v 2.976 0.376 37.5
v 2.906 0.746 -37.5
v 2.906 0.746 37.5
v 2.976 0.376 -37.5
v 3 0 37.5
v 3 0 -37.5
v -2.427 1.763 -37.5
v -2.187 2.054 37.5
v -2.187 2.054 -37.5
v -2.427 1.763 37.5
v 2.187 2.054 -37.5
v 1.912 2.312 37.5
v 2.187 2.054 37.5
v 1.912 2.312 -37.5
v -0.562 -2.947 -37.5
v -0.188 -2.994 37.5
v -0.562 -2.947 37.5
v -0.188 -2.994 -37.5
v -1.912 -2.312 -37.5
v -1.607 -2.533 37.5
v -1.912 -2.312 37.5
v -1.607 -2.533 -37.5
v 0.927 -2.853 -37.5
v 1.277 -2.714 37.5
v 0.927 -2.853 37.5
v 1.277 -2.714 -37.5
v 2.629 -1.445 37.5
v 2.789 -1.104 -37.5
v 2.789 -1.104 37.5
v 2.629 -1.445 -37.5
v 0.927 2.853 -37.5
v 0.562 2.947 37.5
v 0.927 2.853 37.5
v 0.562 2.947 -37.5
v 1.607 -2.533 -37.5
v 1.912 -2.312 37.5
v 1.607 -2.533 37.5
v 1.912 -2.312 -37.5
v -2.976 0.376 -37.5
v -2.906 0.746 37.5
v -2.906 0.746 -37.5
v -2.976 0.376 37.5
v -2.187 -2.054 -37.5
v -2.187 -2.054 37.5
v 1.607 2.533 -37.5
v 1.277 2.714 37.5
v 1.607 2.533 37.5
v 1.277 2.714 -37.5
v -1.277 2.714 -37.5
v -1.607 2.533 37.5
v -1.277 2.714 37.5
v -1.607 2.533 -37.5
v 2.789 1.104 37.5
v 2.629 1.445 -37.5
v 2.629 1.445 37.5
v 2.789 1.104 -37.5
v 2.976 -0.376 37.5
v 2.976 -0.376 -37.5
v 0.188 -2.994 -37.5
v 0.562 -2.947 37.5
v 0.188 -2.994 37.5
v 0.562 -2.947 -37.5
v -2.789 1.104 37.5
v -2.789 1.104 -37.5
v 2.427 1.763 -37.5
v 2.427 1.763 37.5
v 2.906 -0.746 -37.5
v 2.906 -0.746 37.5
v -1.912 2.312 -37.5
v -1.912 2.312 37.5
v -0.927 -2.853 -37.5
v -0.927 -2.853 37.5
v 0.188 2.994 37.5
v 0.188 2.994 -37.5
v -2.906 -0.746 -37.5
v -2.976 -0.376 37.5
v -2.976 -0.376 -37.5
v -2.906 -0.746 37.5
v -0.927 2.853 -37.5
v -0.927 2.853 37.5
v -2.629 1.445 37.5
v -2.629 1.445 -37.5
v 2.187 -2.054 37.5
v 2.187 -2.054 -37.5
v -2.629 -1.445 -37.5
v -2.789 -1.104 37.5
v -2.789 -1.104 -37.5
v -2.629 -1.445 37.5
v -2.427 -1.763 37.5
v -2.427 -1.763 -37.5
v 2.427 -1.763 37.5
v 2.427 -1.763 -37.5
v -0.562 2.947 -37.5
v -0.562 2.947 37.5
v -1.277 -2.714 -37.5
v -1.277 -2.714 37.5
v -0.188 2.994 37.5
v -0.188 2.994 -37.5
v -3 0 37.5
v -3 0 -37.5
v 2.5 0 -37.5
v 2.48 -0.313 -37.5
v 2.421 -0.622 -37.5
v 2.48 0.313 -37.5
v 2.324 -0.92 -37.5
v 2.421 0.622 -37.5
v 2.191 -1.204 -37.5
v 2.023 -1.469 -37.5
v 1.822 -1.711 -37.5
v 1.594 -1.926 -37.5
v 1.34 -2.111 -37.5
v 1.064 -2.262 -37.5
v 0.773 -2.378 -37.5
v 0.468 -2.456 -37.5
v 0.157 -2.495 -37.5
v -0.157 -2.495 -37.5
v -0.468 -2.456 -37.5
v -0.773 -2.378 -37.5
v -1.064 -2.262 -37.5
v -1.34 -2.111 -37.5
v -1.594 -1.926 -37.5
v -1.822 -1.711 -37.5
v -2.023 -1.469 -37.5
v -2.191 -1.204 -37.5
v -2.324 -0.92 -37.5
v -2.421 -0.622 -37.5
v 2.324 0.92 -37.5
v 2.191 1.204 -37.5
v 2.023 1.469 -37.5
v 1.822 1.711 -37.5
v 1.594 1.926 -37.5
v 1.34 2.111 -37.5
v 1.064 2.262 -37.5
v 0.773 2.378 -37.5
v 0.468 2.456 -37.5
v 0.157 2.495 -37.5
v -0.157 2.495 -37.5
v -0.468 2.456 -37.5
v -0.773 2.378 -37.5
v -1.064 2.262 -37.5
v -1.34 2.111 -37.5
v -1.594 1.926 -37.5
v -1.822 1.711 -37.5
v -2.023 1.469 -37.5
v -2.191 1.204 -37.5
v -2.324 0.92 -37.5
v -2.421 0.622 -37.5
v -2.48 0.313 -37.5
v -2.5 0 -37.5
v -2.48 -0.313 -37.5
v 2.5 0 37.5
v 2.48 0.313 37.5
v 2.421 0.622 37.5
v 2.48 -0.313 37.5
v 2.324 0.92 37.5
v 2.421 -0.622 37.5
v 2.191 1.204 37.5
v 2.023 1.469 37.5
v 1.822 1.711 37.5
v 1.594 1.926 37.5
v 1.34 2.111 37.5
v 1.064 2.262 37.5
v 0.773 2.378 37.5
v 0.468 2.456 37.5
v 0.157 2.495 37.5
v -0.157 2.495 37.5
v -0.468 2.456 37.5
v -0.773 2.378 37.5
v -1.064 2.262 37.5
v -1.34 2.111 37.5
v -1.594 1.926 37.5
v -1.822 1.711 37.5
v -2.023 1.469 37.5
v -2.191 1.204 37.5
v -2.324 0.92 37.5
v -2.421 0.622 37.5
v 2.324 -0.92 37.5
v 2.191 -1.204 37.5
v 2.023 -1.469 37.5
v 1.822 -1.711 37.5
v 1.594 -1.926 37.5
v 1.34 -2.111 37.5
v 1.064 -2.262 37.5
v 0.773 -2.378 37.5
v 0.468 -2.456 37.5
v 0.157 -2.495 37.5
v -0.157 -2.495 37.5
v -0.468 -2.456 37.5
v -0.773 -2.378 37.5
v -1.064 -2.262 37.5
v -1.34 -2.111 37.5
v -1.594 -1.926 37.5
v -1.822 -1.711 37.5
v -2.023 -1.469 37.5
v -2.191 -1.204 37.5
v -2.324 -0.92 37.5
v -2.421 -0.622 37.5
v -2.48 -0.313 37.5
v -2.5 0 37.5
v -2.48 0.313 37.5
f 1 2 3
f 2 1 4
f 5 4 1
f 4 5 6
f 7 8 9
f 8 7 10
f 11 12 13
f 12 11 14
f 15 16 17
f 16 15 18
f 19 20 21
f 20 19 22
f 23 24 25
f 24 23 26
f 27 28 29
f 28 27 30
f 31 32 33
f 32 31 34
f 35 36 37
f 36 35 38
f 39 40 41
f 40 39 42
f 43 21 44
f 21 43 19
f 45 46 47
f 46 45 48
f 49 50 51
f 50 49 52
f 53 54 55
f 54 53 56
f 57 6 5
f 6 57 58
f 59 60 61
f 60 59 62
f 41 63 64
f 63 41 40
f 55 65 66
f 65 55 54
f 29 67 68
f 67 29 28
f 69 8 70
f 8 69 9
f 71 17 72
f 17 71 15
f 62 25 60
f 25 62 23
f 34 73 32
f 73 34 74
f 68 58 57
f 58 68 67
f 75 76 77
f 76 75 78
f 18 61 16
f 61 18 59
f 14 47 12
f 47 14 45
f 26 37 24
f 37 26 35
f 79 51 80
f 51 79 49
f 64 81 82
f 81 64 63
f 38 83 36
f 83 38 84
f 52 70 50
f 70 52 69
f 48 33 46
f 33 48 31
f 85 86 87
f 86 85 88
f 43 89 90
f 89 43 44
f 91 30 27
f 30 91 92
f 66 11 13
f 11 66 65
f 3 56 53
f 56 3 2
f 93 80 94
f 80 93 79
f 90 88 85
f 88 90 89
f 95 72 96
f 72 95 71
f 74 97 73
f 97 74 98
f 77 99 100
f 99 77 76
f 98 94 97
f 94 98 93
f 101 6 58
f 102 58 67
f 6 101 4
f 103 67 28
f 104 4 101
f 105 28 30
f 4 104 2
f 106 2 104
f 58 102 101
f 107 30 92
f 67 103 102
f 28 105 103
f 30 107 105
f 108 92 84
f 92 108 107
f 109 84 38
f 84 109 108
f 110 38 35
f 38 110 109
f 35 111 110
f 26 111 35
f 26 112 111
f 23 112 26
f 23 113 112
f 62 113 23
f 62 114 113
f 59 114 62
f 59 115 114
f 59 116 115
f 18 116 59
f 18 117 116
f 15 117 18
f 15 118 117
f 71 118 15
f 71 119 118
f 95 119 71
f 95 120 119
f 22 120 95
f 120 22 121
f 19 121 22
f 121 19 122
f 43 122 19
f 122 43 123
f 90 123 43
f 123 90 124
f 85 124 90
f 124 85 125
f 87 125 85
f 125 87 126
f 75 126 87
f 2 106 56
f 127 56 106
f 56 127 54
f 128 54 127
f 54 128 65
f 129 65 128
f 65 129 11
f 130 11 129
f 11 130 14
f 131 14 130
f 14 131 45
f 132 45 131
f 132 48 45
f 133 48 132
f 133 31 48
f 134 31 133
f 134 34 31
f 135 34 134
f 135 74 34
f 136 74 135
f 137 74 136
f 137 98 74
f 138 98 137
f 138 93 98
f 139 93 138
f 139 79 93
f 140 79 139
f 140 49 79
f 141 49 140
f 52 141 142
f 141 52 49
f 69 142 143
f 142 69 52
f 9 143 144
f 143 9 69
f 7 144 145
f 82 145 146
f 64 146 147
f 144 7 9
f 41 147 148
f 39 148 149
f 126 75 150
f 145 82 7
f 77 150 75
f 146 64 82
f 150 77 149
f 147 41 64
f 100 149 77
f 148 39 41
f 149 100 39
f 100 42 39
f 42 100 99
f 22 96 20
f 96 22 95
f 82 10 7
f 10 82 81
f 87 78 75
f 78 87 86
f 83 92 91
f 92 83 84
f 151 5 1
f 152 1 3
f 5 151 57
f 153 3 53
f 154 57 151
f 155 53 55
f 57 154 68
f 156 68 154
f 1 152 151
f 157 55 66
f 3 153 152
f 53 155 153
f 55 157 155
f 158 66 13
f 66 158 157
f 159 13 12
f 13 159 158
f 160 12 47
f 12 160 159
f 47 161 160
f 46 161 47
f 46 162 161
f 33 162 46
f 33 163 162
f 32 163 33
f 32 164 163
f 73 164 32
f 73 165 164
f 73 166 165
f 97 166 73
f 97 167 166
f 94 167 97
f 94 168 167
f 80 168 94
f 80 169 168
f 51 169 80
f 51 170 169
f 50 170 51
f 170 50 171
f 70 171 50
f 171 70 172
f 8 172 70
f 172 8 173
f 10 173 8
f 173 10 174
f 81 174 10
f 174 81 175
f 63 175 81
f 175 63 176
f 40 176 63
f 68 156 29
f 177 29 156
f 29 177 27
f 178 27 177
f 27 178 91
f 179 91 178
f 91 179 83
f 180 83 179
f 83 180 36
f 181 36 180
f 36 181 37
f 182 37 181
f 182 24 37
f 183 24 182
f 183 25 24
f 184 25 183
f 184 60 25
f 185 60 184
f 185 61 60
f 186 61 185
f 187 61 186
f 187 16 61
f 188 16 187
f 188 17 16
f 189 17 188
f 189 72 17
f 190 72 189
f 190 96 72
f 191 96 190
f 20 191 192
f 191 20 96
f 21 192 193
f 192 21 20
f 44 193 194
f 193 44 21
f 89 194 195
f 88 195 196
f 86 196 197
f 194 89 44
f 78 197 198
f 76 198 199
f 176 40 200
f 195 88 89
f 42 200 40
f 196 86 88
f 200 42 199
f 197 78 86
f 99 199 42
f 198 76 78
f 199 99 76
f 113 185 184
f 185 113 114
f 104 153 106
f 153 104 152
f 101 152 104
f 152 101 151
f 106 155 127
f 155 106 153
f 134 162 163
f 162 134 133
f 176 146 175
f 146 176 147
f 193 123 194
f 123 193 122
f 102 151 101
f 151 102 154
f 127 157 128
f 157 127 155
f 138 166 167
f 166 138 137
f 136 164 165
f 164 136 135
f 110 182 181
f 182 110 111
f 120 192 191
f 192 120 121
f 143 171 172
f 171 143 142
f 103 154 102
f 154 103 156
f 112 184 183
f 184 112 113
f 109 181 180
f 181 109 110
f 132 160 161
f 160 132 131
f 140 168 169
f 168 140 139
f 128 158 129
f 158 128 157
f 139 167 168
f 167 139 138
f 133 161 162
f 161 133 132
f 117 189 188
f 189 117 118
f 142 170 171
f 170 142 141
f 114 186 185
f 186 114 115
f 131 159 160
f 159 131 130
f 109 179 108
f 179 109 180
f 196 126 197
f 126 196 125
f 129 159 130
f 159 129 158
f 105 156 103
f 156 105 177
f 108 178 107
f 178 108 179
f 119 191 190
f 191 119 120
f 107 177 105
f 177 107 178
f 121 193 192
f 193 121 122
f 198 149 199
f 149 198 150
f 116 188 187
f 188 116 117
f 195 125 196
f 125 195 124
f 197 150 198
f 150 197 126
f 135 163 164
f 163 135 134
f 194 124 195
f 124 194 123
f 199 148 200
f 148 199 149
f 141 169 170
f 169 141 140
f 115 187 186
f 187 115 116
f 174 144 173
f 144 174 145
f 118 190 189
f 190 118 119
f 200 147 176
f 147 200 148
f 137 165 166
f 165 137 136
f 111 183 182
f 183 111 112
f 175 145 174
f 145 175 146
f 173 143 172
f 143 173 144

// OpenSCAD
$fn = 50;


difference() {
	union() {
		translate(v = [0, 0, -37.5000000000]) {
			cylinder(h = 75, r = 3.0000000000);
		}
	}
	union() {
		translate(v = [0, 0, -100.0000000000]) {
			cylinder(h = 200, r = 2.5000000000);
		}
	}
}
